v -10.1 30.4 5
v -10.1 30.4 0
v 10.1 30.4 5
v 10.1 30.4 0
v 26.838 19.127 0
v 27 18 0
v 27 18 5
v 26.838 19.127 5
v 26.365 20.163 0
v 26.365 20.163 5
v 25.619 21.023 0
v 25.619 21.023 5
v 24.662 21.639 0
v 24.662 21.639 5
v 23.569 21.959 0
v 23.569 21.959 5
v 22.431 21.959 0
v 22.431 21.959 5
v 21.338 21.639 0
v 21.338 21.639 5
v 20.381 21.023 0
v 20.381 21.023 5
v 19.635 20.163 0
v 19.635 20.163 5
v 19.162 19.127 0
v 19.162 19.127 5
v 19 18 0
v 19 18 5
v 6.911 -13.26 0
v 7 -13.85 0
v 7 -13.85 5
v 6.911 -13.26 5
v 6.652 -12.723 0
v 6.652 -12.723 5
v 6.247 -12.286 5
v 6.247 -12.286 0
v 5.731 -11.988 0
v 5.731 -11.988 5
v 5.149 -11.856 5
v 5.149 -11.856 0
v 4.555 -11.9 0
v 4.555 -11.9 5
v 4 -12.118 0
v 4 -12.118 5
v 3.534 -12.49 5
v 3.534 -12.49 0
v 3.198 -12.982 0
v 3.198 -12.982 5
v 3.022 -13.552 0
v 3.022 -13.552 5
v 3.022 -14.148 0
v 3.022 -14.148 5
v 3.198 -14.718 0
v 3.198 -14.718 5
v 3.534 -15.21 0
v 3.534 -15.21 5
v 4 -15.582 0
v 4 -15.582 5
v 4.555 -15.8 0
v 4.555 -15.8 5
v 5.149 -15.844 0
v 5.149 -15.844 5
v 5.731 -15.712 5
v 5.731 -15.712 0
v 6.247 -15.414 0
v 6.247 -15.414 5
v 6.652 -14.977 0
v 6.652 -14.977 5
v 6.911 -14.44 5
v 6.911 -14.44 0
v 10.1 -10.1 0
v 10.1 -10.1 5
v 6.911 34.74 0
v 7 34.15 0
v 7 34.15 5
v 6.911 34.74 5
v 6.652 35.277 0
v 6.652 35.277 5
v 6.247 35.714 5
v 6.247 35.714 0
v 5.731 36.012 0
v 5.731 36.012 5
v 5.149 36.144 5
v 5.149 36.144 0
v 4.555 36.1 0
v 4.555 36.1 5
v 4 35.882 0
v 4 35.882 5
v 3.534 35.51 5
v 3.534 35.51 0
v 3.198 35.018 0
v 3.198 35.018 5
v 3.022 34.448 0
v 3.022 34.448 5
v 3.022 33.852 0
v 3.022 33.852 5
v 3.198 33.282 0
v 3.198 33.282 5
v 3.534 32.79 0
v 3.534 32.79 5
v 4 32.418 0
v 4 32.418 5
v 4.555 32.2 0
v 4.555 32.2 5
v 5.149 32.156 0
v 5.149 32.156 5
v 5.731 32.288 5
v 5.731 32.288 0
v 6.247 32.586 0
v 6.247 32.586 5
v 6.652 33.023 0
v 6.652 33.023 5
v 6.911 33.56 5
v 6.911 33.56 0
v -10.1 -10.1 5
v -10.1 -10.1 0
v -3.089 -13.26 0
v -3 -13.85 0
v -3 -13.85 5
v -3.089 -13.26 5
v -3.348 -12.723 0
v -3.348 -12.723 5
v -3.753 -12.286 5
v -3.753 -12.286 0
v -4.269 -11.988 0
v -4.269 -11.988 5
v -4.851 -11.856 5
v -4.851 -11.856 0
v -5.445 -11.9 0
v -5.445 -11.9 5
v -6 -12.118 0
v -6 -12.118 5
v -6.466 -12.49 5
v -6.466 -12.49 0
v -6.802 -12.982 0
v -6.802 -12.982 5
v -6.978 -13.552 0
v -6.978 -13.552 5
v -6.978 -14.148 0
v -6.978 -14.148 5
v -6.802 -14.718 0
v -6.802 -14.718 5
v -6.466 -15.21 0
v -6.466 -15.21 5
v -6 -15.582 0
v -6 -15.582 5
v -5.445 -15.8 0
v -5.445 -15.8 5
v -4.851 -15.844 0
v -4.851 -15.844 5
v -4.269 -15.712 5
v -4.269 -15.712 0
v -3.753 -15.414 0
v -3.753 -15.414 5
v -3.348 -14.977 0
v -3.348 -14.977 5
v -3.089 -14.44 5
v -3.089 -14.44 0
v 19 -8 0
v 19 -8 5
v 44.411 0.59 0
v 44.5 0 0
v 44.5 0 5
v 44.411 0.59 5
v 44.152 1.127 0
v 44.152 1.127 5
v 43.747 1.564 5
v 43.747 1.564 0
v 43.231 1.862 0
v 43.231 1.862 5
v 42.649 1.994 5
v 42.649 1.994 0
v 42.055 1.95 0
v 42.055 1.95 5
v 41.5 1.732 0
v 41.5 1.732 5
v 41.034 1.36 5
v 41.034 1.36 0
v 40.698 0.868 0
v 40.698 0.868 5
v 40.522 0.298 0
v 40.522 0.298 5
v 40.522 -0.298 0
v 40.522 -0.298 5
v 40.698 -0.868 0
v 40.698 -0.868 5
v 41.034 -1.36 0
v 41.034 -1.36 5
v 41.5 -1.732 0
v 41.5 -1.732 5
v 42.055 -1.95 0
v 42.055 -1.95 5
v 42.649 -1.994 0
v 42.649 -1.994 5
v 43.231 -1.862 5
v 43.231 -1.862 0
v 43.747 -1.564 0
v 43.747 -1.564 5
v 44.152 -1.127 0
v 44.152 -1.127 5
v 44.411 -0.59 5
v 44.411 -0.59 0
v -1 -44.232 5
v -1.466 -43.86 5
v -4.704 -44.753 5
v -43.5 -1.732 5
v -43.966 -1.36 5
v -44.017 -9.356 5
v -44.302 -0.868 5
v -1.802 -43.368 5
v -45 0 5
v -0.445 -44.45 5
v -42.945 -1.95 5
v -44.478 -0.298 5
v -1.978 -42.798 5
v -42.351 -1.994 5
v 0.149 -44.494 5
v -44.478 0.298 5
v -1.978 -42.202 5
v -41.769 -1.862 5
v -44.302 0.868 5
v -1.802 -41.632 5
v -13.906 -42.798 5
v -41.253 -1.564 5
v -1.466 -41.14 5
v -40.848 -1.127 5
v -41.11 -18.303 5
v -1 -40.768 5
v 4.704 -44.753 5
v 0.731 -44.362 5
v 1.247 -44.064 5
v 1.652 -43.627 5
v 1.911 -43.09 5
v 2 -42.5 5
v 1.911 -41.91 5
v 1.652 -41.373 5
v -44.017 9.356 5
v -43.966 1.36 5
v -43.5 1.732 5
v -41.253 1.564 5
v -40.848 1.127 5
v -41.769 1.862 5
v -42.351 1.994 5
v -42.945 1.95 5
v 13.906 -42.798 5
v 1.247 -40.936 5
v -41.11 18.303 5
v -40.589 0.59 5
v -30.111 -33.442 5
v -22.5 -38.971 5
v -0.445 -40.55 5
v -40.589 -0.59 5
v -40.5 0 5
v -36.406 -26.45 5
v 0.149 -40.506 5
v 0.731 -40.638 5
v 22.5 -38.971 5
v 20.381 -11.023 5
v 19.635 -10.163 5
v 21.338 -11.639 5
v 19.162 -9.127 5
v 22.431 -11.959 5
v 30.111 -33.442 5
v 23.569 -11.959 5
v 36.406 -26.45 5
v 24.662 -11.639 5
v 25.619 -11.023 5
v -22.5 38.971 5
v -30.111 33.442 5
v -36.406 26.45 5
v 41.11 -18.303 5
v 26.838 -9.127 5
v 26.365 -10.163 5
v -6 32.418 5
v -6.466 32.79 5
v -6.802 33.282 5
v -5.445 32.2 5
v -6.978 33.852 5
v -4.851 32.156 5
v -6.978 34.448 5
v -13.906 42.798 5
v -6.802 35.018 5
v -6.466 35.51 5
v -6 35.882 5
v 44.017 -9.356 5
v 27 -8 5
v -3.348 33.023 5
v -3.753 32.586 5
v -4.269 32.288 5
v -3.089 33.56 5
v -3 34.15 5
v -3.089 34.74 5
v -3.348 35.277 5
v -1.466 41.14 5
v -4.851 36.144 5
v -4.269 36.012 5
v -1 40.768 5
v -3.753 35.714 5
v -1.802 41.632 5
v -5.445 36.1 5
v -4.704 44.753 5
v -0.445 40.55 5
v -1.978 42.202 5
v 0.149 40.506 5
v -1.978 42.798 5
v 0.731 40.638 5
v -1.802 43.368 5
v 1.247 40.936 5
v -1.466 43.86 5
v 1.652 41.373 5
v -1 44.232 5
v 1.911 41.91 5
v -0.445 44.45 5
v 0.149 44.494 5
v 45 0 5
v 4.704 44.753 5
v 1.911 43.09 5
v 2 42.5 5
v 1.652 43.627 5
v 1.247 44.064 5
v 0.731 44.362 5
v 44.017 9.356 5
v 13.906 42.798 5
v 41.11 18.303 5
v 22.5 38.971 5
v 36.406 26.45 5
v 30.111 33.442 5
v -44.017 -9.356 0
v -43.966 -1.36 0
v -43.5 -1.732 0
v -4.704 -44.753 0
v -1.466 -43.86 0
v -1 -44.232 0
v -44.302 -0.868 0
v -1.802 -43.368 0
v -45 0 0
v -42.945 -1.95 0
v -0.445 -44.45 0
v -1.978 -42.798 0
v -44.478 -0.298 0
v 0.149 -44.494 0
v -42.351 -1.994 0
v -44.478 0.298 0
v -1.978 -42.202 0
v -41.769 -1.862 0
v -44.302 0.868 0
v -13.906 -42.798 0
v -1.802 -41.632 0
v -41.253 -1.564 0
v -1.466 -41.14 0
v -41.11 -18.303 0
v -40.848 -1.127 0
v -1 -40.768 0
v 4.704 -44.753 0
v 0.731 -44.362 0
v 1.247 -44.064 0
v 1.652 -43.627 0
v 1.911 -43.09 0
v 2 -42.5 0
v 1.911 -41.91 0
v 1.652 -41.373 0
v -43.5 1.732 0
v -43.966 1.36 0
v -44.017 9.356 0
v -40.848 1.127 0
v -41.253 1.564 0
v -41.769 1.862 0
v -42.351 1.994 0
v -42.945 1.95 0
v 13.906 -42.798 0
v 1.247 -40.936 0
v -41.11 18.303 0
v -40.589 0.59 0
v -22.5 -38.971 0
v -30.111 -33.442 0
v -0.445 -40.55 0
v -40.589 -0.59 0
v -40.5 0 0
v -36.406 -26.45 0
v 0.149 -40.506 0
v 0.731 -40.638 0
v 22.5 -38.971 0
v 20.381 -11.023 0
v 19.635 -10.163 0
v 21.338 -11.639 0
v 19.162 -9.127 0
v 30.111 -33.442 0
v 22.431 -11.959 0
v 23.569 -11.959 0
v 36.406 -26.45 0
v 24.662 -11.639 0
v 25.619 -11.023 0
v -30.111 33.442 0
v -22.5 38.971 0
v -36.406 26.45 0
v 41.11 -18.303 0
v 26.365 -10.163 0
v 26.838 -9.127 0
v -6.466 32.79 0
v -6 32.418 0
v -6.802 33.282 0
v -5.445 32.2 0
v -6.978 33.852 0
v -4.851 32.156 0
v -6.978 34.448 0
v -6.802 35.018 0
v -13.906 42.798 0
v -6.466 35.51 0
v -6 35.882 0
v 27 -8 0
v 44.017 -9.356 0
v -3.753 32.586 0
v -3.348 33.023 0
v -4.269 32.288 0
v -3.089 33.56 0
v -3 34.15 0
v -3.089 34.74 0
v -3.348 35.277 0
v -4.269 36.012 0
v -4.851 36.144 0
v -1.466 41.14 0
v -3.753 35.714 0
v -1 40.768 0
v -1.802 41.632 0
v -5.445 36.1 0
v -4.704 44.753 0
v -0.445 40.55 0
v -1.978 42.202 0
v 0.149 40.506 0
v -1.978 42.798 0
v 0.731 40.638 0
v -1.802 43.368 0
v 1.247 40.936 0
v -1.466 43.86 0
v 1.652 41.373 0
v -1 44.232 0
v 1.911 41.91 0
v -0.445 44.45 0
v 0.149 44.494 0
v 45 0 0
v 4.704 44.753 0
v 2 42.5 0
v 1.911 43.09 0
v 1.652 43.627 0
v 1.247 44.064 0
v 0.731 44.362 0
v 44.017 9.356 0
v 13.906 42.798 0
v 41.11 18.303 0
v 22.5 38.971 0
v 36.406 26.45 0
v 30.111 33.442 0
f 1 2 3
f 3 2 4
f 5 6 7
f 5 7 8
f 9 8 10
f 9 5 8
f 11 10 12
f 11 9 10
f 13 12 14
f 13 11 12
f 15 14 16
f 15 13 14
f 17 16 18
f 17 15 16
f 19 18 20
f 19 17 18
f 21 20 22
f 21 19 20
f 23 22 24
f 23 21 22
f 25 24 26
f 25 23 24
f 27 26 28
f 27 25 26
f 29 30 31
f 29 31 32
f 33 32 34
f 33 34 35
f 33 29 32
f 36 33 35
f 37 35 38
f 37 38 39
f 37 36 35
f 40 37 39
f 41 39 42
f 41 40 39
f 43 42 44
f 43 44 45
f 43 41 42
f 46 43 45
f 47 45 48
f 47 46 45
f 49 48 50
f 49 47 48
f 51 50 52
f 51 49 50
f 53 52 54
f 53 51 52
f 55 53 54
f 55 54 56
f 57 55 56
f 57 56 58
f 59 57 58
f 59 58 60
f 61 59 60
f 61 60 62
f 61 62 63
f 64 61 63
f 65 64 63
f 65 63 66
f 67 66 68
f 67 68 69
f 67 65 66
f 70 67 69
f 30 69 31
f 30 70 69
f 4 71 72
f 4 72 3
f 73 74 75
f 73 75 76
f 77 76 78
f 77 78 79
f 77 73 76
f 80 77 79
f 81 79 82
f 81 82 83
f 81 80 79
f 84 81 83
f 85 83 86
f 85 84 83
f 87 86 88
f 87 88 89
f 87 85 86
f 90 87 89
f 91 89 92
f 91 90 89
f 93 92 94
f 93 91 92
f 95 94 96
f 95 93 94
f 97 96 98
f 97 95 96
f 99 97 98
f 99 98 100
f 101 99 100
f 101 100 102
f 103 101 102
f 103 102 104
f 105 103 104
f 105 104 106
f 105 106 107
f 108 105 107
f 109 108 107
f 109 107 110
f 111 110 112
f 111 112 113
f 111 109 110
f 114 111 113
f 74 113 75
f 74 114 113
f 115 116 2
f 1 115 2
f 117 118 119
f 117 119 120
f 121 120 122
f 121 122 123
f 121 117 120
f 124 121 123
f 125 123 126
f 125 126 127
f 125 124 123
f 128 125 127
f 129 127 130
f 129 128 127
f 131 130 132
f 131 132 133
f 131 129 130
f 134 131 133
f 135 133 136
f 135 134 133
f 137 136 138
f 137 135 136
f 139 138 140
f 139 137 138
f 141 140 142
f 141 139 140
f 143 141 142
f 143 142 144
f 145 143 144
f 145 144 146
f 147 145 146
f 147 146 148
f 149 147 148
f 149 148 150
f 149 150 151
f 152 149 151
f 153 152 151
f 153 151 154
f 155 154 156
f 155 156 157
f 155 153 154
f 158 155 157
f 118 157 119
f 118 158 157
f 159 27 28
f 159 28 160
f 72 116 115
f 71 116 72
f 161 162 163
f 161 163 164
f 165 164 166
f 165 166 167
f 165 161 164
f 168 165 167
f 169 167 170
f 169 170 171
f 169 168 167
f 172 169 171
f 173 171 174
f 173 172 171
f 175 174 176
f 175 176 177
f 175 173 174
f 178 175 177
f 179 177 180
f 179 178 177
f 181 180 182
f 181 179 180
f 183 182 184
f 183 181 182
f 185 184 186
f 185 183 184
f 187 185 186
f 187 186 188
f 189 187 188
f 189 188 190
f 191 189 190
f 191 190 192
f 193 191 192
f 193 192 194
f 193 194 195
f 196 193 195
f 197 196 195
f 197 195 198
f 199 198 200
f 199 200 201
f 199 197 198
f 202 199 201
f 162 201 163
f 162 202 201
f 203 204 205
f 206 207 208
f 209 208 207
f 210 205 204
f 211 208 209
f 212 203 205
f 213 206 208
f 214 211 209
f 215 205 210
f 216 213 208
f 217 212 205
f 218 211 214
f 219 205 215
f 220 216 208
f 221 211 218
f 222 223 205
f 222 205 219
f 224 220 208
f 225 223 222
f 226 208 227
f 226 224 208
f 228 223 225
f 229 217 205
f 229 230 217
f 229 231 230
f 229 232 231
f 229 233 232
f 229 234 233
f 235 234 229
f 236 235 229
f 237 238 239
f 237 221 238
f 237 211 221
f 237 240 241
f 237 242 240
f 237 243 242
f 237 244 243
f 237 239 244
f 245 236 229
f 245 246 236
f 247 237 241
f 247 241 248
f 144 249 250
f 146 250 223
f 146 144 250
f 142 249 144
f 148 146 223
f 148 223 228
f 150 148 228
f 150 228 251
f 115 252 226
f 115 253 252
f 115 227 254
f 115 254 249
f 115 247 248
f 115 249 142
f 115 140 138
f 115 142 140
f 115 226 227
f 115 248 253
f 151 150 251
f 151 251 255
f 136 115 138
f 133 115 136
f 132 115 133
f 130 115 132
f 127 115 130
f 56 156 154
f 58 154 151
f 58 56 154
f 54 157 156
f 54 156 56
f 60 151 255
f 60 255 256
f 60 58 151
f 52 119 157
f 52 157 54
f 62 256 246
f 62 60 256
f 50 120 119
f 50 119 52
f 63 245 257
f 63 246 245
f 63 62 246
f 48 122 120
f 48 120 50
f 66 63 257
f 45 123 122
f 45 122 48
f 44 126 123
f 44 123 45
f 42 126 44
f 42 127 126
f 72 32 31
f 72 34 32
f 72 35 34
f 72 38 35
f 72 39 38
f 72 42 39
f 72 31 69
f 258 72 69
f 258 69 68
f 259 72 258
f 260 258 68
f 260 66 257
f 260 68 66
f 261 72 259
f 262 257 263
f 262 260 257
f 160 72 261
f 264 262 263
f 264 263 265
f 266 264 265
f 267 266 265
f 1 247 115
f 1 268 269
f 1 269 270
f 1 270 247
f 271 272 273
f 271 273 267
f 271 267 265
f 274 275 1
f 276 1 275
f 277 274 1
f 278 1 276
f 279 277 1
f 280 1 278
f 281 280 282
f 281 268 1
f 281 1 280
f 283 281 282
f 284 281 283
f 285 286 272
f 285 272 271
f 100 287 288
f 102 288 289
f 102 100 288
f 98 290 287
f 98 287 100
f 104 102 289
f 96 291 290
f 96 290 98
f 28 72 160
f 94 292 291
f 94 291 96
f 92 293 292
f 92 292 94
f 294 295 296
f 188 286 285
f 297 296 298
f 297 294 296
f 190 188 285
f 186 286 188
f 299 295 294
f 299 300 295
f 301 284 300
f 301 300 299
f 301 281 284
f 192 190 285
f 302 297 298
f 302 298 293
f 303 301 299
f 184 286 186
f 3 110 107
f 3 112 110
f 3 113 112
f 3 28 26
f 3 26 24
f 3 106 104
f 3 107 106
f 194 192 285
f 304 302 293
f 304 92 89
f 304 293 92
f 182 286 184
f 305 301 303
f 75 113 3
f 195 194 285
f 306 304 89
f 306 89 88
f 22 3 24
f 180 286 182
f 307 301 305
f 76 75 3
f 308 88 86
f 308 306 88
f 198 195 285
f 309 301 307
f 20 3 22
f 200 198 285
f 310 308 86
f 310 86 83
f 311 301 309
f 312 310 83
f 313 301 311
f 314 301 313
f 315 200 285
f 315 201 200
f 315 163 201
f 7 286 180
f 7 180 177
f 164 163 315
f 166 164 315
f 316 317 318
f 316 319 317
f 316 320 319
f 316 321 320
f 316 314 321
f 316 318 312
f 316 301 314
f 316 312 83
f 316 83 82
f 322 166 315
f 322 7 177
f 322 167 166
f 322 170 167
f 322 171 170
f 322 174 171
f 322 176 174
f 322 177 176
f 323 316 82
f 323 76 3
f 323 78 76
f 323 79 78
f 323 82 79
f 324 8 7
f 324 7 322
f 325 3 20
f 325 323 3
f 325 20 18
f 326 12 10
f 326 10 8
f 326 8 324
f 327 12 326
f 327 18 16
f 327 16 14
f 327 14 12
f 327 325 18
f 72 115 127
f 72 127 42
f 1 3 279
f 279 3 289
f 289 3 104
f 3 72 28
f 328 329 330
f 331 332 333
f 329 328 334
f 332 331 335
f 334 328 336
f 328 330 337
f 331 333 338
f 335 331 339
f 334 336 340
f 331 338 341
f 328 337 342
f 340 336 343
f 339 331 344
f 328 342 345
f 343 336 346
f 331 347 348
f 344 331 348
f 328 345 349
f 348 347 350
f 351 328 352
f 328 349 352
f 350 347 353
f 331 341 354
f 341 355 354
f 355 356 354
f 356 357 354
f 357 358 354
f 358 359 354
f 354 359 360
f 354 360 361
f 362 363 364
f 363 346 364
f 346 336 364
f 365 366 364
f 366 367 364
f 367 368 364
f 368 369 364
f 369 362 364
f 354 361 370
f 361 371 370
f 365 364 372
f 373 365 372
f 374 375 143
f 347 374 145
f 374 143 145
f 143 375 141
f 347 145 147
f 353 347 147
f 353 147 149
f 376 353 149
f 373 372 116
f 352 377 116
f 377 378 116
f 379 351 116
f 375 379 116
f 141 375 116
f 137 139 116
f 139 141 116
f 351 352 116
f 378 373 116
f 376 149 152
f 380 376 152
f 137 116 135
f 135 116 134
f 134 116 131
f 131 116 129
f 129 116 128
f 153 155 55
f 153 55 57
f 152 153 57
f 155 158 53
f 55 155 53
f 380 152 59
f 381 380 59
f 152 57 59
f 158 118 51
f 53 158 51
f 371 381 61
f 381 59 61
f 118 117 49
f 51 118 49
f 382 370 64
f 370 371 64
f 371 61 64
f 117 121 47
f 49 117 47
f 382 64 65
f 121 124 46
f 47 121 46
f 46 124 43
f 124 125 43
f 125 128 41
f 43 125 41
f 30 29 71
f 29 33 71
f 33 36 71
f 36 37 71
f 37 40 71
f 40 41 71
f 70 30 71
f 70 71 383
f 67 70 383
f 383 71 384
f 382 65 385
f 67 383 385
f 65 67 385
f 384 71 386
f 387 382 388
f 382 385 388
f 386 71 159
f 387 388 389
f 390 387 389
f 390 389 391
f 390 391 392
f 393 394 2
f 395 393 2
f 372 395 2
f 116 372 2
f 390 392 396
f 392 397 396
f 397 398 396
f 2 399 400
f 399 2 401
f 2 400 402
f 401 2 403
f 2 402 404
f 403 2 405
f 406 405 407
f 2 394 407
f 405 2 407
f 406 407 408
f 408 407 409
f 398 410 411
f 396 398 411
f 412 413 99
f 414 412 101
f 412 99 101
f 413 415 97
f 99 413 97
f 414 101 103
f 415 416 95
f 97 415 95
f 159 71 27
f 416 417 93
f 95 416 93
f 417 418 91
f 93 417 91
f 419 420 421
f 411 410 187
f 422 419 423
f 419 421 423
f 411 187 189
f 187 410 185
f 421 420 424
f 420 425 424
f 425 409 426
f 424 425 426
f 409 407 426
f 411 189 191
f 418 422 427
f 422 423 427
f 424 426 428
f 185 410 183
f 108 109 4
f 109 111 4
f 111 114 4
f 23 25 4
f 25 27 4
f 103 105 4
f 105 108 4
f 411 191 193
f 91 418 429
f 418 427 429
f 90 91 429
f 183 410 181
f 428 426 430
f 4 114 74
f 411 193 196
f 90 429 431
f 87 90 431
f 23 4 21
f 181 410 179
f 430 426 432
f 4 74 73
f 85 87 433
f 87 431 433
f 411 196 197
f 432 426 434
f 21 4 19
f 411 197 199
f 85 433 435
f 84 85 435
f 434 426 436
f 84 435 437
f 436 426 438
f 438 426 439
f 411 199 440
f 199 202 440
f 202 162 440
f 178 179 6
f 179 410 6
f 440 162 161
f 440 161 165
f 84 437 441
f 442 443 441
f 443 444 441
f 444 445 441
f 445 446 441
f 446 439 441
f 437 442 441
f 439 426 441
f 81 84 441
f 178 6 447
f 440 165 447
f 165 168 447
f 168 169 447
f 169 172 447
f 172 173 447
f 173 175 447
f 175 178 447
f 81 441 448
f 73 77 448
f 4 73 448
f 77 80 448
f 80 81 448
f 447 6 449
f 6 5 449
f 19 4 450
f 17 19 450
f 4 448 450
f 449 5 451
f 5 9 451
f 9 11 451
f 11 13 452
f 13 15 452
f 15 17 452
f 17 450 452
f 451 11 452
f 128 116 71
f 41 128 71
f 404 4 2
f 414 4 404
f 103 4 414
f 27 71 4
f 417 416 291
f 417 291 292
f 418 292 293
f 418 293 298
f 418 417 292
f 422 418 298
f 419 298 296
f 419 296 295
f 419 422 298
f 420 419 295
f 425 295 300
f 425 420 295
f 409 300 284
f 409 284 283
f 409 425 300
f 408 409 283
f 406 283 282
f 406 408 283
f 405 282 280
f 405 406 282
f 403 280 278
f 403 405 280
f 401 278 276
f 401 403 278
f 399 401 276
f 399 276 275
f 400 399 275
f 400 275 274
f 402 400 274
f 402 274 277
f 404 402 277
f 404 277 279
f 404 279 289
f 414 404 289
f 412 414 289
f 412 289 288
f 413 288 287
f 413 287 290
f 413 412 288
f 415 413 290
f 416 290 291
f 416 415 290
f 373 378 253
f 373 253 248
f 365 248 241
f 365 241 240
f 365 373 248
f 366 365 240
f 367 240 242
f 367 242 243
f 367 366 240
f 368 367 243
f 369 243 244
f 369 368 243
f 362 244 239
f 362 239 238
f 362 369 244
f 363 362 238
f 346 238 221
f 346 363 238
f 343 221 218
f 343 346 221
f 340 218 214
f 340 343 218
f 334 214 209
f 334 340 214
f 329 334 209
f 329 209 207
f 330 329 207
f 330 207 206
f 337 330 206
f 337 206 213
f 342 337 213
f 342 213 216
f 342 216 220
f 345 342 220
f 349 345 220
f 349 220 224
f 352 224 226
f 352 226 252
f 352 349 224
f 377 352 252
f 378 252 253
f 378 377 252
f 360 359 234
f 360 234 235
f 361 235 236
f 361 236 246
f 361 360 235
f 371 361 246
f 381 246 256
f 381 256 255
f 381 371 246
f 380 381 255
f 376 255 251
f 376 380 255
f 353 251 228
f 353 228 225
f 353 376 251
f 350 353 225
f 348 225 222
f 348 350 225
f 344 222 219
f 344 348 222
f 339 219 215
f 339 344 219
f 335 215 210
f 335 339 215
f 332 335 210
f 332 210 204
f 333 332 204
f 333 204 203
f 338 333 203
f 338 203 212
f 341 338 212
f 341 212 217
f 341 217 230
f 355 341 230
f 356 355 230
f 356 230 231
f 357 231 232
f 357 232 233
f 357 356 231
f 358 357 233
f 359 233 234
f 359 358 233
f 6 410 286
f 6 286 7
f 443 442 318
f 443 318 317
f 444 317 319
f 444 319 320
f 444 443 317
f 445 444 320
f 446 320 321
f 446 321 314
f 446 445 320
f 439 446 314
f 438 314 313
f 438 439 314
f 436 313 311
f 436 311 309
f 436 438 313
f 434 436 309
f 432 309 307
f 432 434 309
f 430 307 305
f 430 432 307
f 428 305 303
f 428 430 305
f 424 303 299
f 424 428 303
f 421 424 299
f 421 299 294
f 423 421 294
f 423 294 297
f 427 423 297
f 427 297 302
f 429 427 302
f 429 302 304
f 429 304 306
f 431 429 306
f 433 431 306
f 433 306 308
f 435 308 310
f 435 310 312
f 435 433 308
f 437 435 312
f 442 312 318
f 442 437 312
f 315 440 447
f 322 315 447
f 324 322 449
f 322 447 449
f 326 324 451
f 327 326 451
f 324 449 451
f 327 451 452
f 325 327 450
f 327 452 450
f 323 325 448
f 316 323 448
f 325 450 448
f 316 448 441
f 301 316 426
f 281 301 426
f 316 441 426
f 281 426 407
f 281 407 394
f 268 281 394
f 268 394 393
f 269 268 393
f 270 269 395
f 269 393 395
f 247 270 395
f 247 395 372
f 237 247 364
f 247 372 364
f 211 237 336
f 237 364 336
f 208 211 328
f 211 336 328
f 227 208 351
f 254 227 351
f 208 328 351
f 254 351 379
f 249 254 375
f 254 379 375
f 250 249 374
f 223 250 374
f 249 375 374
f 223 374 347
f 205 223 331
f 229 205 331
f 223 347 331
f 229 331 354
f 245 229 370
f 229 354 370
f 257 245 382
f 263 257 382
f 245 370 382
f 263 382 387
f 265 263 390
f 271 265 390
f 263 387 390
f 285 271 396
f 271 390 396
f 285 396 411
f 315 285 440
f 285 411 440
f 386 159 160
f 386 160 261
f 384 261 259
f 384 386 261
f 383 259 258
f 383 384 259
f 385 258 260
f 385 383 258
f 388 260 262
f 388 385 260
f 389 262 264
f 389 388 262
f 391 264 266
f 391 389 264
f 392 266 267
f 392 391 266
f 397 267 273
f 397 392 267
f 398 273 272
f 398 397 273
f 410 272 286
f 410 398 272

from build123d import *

# Parameters (mm, degrees)
SKETCH1_R           = 45
SKETCH1_R_2         = 2
SKETCH1_W           = 20.2
SKETCH1_H           = 40.5
BOSS_EXTRUDE1_DEPTH = 5
CUT_EXTRUDE1_DEPTH  = 10


with BuildPart() as part:
    # Sketch1 → Boss-Extrude1 (new body)
    with BuildSketch(Plane.XY):
        Circle(SKETCH1_R)
        with Locations((0, 42.5)):
            Circle(SKETCH1_R_2, mode=Mode.SUBTRACT)
        with Locations((-42.5, 0)):
            Circle(SKETCH1_R_2, mode=Mode.SUBTRACT)
        with Locations((0, -42.5)):
            Circle(SKETCH1_R_2, mode=Mode.SUBTRACT)
        with Locations((42.5, 0)):
            Circle(SKETCH1_R_2, mode=Mode.SUBTRACT)
        with Locations((-5, -13.85)):
            Circle(SKETCH1_R_2, mode=Mode.SUBTRACT)
        with Locations((5, -13.85)):
            Circle(SKETCH1_R_2, mode=Mode.SUBTRACT)
        with Locations((5, 34.15)):
            Circle(SKETCH1_R_2, mode=Mode.SUBTRACT)
        with Locations((-5, 34.15)):
            Circle(SKETCH1_R_2, mode=Mode.SUBTRACT)
        with Locations((0, 10.15)):
            Rectangle(SKETCH1_W, SKETCH1_H, mode=Mode.SUBTRACT)
    extrude(amount=BOSS_EXTRUDE1_DEPTH)

    # Sketch2 → Cut-Extrude1 (cut)
    with BuildSketch(Plane(origin=(0, 0, 0), x_dir=(-1, 0, 0), z_dir=(0, 0, -1))):
        with BuildLine():
            Line((-19, 18), (-19, -8))
            ThreePointArc((-19, -8), (-23, -12), (-27, -8))
            Line((-27, -8), (-27, 18))
            ThreePointArc((-27, 18), (-23, 22), (-19, 18))
        make_face()
    extrude(amount=-CUT_EXTRUDE1_DEPTH, mode=Mode.SUBTRACT)


solid = part.part
